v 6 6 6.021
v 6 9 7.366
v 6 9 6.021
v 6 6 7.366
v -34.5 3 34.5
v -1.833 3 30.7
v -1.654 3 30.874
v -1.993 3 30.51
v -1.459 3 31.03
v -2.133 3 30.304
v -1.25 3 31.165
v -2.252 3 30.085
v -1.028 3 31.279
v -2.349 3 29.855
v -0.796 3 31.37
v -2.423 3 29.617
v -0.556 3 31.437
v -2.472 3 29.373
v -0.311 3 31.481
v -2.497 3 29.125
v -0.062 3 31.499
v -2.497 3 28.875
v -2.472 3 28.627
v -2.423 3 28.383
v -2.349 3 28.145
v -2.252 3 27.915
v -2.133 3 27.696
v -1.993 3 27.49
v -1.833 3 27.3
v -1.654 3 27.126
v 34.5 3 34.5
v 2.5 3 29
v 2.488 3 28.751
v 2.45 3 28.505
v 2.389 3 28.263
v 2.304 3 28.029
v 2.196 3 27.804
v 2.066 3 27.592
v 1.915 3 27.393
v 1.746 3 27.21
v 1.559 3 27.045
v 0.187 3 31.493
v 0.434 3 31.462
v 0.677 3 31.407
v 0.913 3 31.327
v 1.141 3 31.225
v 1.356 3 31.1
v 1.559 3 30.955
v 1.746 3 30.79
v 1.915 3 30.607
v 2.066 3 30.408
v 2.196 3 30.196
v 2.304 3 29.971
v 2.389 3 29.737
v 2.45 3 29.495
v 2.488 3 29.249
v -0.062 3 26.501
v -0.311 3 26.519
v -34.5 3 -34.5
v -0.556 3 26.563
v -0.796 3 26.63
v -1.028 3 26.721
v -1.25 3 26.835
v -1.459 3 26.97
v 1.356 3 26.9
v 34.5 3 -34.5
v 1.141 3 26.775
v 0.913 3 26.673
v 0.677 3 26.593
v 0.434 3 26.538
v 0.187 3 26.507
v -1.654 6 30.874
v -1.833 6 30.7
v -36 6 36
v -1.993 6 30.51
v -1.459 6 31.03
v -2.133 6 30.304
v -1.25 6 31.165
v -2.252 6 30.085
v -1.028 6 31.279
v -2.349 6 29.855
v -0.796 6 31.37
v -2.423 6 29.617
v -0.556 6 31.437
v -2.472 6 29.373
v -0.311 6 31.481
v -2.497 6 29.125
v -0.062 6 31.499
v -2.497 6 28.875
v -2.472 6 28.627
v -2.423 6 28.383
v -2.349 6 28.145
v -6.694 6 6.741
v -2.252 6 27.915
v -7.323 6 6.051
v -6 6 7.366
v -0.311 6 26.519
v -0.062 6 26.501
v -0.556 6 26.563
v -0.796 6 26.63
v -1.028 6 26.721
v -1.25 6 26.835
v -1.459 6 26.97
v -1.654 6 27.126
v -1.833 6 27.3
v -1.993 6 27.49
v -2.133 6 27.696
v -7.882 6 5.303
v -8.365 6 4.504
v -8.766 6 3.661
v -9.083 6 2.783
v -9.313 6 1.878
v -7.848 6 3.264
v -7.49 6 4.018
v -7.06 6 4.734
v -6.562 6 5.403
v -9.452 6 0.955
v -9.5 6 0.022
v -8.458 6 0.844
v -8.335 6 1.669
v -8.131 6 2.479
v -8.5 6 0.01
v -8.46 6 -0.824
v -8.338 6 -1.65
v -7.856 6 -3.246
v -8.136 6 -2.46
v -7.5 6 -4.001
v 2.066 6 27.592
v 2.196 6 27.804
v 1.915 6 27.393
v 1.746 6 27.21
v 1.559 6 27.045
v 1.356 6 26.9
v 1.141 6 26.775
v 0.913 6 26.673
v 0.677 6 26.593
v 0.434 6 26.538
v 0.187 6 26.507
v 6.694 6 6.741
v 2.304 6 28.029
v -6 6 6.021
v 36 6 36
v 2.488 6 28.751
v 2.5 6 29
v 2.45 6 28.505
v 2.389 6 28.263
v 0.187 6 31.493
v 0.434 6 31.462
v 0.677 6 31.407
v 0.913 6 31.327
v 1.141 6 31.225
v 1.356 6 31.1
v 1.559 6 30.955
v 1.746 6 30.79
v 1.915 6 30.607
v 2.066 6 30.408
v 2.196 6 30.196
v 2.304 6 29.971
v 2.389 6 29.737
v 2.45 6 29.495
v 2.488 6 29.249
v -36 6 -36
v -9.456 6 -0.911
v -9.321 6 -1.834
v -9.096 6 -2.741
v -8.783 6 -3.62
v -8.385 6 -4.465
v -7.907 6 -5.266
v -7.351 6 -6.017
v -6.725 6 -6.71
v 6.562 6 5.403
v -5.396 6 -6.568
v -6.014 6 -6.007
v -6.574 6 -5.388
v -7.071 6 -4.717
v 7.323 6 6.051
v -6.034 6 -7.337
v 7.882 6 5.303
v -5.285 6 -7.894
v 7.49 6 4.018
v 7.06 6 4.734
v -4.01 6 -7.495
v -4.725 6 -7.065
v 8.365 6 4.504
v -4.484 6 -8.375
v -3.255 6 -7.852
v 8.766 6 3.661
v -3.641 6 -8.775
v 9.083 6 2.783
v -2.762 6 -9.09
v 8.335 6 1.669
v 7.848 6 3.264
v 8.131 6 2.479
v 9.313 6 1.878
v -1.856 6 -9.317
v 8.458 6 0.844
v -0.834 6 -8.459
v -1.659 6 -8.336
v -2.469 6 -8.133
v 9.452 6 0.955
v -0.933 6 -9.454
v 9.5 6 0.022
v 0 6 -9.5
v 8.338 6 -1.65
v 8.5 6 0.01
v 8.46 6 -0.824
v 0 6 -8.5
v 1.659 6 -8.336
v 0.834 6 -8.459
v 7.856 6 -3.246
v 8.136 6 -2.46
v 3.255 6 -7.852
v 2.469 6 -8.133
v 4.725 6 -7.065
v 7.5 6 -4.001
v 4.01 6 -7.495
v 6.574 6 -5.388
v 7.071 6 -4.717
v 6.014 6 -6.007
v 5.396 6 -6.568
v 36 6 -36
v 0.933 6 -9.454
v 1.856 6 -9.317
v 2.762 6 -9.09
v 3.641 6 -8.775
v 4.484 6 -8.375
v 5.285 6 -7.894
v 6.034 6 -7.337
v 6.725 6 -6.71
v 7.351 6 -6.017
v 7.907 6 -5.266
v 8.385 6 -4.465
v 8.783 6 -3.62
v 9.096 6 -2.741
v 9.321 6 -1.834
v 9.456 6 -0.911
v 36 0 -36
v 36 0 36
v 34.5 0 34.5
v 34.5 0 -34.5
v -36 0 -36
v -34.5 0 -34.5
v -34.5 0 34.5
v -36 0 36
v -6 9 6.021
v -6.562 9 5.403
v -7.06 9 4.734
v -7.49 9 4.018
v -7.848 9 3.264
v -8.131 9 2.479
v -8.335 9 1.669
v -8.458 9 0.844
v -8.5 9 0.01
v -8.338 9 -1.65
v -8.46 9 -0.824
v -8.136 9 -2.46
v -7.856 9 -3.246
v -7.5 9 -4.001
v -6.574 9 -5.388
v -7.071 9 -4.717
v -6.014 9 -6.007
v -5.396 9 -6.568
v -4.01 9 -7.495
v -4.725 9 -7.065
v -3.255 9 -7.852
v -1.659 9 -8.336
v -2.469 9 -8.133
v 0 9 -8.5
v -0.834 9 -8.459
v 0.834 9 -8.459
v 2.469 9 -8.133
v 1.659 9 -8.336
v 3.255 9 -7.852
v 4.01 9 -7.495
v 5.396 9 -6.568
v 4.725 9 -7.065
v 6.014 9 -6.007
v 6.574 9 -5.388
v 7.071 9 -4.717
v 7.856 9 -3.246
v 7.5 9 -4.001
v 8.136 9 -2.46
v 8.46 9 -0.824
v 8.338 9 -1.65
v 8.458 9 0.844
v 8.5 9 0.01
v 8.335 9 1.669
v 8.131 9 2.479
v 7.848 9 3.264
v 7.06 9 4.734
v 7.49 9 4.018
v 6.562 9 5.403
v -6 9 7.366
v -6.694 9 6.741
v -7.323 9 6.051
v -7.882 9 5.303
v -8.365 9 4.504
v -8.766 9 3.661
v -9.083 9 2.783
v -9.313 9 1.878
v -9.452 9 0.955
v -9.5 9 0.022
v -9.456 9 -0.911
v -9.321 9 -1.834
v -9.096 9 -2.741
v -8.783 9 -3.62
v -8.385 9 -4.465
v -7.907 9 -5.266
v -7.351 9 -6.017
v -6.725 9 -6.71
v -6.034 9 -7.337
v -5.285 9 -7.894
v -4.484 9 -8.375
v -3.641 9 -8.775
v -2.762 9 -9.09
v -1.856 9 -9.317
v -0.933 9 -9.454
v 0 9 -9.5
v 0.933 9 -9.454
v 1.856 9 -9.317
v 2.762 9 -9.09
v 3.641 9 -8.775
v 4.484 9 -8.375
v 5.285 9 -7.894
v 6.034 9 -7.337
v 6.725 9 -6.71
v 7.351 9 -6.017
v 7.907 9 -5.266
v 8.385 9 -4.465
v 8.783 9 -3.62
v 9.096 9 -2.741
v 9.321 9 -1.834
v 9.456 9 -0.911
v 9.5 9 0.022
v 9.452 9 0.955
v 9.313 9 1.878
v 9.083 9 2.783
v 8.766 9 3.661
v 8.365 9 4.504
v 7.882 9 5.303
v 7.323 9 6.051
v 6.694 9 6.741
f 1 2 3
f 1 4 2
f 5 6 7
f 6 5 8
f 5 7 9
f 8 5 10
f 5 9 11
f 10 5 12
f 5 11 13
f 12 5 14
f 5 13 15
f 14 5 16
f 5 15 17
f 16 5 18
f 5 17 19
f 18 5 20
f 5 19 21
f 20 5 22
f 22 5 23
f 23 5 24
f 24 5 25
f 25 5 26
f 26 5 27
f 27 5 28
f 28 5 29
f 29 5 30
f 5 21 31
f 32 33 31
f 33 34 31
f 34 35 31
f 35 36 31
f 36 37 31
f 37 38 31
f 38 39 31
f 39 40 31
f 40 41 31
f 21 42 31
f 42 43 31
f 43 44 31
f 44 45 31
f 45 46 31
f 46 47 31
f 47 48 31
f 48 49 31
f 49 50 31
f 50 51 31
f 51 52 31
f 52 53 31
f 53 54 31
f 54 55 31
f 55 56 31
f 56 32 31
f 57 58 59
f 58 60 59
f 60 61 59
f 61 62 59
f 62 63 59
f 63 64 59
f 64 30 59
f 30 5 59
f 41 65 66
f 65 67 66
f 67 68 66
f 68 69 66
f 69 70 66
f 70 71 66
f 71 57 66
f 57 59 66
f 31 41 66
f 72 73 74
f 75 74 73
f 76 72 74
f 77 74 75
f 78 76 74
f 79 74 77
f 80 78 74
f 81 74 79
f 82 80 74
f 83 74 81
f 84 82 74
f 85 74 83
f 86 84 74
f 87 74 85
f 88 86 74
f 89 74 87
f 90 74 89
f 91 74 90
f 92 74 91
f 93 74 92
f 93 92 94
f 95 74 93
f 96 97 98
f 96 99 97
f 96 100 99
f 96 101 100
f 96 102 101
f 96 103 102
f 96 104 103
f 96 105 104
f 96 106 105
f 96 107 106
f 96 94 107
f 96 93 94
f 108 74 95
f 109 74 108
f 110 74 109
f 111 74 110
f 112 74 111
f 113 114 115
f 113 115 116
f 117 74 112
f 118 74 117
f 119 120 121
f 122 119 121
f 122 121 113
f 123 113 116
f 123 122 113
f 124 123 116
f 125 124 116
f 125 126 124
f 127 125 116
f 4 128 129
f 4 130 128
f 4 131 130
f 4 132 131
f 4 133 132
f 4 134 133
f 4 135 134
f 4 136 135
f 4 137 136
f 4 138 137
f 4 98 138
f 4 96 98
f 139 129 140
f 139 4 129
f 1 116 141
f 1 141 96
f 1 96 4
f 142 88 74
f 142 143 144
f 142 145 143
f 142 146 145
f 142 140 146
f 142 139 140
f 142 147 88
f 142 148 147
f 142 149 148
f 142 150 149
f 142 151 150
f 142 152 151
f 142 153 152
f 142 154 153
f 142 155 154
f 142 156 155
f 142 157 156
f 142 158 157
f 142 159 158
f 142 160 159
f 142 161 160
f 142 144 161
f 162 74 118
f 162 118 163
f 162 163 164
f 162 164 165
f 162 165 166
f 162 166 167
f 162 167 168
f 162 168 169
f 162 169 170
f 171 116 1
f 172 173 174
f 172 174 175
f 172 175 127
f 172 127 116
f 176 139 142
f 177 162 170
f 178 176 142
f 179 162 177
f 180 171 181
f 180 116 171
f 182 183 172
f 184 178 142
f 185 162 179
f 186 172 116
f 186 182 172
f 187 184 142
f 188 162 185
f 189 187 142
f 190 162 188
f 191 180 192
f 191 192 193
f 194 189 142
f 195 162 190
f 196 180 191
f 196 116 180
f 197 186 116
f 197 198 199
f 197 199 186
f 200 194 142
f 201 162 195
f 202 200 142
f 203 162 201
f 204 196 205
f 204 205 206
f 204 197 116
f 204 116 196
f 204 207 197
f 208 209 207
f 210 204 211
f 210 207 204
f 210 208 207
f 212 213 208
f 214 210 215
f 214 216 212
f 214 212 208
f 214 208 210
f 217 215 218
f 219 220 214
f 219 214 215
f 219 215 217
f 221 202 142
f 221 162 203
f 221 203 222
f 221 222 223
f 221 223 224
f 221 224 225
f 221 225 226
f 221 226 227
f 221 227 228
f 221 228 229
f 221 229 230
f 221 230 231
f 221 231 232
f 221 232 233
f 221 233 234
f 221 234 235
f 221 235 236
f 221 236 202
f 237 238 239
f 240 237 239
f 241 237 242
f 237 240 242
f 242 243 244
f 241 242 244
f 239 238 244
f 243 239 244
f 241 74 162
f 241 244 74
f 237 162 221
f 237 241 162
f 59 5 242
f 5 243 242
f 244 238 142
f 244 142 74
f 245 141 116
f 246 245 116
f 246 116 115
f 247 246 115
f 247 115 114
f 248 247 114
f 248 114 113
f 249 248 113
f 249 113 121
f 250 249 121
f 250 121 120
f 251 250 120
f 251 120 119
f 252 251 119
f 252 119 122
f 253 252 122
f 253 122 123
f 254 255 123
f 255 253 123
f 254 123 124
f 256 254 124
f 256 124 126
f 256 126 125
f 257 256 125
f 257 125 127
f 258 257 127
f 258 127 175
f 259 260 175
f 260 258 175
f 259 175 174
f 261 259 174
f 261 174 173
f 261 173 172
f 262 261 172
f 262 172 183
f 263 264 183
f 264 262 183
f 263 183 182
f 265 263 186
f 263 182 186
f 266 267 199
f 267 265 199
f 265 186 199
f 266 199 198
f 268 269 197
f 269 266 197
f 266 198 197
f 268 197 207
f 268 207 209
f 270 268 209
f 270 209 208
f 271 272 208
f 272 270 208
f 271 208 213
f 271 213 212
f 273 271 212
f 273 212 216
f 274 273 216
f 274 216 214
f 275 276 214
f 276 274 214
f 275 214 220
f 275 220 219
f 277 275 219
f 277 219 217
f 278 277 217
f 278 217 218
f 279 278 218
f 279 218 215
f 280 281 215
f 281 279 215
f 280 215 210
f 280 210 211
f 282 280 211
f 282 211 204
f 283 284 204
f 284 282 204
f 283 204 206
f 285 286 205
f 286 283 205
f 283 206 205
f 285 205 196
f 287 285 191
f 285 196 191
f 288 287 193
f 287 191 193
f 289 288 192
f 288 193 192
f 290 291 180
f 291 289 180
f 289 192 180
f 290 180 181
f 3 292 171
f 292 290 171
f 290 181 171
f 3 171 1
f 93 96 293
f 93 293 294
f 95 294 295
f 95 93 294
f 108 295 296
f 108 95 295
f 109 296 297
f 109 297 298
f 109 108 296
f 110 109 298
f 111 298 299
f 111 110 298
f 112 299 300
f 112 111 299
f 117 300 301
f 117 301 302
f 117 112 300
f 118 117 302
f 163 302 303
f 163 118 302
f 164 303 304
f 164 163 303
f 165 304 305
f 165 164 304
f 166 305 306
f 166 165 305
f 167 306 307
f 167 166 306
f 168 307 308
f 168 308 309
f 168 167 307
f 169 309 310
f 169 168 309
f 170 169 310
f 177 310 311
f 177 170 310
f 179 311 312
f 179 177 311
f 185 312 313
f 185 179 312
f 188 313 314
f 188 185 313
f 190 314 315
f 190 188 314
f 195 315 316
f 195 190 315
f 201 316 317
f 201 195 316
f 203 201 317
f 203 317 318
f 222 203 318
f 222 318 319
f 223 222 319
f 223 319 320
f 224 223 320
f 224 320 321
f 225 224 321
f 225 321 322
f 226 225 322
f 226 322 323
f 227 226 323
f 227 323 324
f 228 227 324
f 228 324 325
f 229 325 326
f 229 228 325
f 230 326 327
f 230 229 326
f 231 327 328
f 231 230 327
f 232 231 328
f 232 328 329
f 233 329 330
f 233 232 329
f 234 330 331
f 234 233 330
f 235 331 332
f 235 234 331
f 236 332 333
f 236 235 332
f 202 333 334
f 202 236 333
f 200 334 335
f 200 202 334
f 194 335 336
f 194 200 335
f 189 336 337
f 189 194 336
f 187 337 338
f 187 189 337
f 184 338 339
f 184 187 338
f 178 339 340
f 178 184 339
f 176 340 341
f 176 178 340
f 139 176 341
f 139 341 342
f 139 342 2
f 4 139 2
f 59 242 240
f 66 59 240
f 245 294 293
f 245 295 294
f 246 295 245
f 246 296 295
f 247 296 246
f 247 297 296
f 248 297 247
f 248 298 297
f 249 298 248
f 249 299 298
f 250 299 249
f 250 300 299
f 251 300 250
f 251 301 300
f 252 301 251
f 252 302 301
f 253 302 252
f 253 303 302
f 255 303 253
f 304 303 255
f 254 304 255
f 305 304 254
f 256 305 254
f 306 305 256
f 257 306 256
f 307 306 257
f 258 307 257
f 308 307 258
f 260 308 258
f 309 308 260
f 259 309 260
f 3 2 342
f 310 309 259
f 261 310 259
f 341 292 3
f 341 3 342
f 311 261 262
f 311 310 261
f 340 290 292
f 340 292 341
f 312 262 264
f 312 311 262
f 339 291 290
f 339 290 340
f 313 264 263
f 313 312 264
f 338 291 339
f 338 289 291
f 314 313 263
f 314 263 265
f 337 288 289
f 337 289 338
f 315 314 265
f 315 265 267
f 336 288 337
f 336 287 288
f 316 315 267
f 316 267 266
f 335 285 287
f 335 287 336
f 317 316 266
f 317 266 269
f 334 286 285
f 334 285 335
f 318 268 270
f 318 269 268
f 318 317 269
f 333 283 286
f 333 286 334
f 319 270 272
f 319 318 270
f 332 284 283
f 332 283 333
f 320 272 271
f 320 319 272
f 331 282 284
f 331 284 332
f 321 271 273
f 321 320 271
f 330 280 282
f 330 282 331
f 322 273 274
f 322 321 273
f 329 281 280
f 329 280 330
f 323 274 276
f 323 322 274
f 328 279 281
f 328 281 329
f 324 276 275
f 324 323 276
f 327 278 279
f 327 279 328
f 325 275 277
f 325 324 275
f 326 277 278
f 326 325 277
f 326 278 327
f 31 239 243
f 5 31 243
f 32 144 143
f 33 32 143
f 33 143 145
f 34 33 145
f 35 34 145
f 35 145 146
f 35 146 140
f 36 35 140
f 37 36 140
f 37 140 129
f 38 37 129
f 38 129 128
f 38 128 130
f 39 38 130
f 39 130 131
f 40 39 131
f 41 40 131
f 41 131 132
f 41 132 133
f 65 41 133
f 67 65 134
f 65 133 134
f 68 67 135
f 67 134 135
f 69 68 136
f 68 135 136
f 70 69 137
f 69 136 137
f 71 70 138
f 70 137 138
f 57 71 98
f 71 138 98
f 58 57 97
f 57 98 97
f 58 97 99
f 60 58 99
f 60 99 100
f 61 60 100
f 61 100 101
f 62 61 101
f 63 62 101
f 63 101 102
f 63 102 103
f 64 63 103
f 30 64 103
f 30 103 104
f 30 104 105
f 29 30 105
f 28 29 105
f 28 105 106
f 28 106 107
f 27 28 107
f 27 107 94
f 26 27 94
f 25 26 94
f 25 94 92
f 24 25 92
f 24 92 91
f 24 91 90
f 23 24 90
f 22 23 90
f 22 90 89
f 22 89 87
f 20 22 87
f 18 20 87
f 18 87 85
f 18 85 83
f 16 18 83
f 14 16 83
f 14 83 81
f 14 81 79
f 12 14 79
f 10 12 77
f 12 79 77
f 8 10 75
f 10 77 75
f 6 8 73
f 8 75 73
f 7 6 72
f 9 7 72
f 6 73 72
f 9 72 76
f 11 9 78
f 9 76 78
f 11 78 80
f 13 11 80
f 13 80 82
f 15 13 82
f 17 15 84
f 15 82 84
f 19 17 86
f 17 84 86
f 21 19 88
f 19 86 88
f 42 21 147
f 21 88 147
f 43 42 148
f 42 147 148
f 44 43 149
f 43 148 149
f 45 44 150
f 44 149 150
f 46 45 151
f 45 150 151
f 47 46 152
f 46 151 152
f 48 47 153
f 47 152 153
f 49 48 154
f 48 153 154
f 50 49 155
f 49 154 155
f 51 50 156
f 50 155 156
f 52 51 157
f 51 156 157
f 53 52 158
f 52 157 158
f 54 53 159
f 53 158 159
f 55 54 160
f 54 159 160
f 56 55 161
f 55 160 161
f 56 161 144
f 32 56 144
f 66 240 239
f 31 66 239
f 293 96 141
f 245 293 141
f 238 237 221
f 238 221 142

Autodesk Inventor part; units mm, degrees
ref_plane "YZ Plane" through (0, 0, 0) normal (1, 0, 0) x (0, 1, 0)
ref_plane "XZ Plane" through (0, 0, 0) normal (0, 1, 0) x (-1, 0, 0)
ref_plane "XY Plane" through (0, 0, 0) normal (0, 0, 1) x (1, 0, 0)
sketch "Boceto1" plane through (0, 0, 0) normal (0, 1, 0) x (-1, 0, 0)
  line L0 (-36, 36) -> (36, 36)
  line L1 (36, 36) -> (36, -36)
  line L2 (36, -36) -> (-36, -36)
  line L3 (-36, -36) -> (-36, 36)
  line L4 (-36, 36) -> (36, -36) construction
  line L5 (36, 36) -> (-36, -36) construction
  line L6 (-34.5, 34.5) -> (34.5, 34.5)
  line L7 (34.5, 34.5) -> (34.5, -34.5)
  line L8 (34.5, -34.5) -> (-34.5, -34.5)
  line L9 (-34.5, -34.5) -> (-34.5, 34.5)
  line L10 (-34.5, 34.5) -> (34.5, -34.5) construction
  line L11 (34.5, 34.5) -> (-34.5, -34.5) construction
  point P0 (0, 0)
  dimension "d0" = 72
  dimension "d1" = 72
  dimension "d2" = 69
  dimension "d3" = 69
extrude "Extrusión1" add sketch "Boceto1" along normal blind 3
sketch "Boceto2" plane through (0, 3, 0) normal (0, 1, 0) x (1, 0, 0)
  line L0 (-36, 36) -> (-36, -36) projected
  line L1 (-36, -36) -> (36, -36) projected
  line L2 (36, 36) -> (-36, 36) projected
  line L3 (36, -36) -> (36, 36) projected
  line L4 (36, -36) -> (-36, -36)
  line L5 (-36, -36) -> (-36, 36)
  line L6 (-36, 36) -> (36, 36)
  line L7 (36, 36) -> (36, -36)
  line L8 (36, -36) -> (-36, 36) construction
  line L9 (-36, -36) -> (36, 36) construction
  point P0 (0, 0)
extrude "Extrusión2" add sketch "Boceto2" along normal blind 3
sketch "Boceto3" plane through (0, 6, 0) normal (0, 1, 0) x (1, 0, 0)
  line L0 (-36, 36) -> (-36, -36) projected
  line L1 (-36, -36) -> (36, -36) projected
  line L2 (36, -36) -> (36, 36) projected
  line L3 (36, 36) -> (-36, 36) projected
  circle A0 centre (0, -29) radius 2.5
  circle A1 centre (0, 0) radius 8.5
  circle A2 centre (0, 0) radius 9.5
  line L4 (6, -13) -> (-6, -5) construction
  line L5 (-6, -13) -> (6, -5) construction
  line L6 (-6, -7.3655) -> (-6, -6.0208)
  line L7 (6, -7.3655) -> (6, -6.0208)
  arc A3 (-6, -6.0208) -> (6, -6.0208) centre (0, 0) ccw
  arc A4 (-6, -7.3655) -> (6, -7.3655) centre (0, 0) ccw
  point P0 (0, -9)
  dimension "d8" = 5
  dimension "d9" = 17
  dimension "d10" = 19
extrude "Extrusión3" add sketch "Boceto3" along normal blind 3 contours A1 L6 A2 L7 picked at (9.0782, 0.7435)
sketch "Boceto4" plane through (0, 6, 0) normal (0, 1, 0) x (1, 0, 0)
  circle A0 centre (0, -29) radius 2.5
  point P0 (0, 0)
  dimension "d13" = 5
extrude "Extrusión4" cut sketch "Boceto4" against normal blind 3
properties part number "Tapapotenciometro_v1"
